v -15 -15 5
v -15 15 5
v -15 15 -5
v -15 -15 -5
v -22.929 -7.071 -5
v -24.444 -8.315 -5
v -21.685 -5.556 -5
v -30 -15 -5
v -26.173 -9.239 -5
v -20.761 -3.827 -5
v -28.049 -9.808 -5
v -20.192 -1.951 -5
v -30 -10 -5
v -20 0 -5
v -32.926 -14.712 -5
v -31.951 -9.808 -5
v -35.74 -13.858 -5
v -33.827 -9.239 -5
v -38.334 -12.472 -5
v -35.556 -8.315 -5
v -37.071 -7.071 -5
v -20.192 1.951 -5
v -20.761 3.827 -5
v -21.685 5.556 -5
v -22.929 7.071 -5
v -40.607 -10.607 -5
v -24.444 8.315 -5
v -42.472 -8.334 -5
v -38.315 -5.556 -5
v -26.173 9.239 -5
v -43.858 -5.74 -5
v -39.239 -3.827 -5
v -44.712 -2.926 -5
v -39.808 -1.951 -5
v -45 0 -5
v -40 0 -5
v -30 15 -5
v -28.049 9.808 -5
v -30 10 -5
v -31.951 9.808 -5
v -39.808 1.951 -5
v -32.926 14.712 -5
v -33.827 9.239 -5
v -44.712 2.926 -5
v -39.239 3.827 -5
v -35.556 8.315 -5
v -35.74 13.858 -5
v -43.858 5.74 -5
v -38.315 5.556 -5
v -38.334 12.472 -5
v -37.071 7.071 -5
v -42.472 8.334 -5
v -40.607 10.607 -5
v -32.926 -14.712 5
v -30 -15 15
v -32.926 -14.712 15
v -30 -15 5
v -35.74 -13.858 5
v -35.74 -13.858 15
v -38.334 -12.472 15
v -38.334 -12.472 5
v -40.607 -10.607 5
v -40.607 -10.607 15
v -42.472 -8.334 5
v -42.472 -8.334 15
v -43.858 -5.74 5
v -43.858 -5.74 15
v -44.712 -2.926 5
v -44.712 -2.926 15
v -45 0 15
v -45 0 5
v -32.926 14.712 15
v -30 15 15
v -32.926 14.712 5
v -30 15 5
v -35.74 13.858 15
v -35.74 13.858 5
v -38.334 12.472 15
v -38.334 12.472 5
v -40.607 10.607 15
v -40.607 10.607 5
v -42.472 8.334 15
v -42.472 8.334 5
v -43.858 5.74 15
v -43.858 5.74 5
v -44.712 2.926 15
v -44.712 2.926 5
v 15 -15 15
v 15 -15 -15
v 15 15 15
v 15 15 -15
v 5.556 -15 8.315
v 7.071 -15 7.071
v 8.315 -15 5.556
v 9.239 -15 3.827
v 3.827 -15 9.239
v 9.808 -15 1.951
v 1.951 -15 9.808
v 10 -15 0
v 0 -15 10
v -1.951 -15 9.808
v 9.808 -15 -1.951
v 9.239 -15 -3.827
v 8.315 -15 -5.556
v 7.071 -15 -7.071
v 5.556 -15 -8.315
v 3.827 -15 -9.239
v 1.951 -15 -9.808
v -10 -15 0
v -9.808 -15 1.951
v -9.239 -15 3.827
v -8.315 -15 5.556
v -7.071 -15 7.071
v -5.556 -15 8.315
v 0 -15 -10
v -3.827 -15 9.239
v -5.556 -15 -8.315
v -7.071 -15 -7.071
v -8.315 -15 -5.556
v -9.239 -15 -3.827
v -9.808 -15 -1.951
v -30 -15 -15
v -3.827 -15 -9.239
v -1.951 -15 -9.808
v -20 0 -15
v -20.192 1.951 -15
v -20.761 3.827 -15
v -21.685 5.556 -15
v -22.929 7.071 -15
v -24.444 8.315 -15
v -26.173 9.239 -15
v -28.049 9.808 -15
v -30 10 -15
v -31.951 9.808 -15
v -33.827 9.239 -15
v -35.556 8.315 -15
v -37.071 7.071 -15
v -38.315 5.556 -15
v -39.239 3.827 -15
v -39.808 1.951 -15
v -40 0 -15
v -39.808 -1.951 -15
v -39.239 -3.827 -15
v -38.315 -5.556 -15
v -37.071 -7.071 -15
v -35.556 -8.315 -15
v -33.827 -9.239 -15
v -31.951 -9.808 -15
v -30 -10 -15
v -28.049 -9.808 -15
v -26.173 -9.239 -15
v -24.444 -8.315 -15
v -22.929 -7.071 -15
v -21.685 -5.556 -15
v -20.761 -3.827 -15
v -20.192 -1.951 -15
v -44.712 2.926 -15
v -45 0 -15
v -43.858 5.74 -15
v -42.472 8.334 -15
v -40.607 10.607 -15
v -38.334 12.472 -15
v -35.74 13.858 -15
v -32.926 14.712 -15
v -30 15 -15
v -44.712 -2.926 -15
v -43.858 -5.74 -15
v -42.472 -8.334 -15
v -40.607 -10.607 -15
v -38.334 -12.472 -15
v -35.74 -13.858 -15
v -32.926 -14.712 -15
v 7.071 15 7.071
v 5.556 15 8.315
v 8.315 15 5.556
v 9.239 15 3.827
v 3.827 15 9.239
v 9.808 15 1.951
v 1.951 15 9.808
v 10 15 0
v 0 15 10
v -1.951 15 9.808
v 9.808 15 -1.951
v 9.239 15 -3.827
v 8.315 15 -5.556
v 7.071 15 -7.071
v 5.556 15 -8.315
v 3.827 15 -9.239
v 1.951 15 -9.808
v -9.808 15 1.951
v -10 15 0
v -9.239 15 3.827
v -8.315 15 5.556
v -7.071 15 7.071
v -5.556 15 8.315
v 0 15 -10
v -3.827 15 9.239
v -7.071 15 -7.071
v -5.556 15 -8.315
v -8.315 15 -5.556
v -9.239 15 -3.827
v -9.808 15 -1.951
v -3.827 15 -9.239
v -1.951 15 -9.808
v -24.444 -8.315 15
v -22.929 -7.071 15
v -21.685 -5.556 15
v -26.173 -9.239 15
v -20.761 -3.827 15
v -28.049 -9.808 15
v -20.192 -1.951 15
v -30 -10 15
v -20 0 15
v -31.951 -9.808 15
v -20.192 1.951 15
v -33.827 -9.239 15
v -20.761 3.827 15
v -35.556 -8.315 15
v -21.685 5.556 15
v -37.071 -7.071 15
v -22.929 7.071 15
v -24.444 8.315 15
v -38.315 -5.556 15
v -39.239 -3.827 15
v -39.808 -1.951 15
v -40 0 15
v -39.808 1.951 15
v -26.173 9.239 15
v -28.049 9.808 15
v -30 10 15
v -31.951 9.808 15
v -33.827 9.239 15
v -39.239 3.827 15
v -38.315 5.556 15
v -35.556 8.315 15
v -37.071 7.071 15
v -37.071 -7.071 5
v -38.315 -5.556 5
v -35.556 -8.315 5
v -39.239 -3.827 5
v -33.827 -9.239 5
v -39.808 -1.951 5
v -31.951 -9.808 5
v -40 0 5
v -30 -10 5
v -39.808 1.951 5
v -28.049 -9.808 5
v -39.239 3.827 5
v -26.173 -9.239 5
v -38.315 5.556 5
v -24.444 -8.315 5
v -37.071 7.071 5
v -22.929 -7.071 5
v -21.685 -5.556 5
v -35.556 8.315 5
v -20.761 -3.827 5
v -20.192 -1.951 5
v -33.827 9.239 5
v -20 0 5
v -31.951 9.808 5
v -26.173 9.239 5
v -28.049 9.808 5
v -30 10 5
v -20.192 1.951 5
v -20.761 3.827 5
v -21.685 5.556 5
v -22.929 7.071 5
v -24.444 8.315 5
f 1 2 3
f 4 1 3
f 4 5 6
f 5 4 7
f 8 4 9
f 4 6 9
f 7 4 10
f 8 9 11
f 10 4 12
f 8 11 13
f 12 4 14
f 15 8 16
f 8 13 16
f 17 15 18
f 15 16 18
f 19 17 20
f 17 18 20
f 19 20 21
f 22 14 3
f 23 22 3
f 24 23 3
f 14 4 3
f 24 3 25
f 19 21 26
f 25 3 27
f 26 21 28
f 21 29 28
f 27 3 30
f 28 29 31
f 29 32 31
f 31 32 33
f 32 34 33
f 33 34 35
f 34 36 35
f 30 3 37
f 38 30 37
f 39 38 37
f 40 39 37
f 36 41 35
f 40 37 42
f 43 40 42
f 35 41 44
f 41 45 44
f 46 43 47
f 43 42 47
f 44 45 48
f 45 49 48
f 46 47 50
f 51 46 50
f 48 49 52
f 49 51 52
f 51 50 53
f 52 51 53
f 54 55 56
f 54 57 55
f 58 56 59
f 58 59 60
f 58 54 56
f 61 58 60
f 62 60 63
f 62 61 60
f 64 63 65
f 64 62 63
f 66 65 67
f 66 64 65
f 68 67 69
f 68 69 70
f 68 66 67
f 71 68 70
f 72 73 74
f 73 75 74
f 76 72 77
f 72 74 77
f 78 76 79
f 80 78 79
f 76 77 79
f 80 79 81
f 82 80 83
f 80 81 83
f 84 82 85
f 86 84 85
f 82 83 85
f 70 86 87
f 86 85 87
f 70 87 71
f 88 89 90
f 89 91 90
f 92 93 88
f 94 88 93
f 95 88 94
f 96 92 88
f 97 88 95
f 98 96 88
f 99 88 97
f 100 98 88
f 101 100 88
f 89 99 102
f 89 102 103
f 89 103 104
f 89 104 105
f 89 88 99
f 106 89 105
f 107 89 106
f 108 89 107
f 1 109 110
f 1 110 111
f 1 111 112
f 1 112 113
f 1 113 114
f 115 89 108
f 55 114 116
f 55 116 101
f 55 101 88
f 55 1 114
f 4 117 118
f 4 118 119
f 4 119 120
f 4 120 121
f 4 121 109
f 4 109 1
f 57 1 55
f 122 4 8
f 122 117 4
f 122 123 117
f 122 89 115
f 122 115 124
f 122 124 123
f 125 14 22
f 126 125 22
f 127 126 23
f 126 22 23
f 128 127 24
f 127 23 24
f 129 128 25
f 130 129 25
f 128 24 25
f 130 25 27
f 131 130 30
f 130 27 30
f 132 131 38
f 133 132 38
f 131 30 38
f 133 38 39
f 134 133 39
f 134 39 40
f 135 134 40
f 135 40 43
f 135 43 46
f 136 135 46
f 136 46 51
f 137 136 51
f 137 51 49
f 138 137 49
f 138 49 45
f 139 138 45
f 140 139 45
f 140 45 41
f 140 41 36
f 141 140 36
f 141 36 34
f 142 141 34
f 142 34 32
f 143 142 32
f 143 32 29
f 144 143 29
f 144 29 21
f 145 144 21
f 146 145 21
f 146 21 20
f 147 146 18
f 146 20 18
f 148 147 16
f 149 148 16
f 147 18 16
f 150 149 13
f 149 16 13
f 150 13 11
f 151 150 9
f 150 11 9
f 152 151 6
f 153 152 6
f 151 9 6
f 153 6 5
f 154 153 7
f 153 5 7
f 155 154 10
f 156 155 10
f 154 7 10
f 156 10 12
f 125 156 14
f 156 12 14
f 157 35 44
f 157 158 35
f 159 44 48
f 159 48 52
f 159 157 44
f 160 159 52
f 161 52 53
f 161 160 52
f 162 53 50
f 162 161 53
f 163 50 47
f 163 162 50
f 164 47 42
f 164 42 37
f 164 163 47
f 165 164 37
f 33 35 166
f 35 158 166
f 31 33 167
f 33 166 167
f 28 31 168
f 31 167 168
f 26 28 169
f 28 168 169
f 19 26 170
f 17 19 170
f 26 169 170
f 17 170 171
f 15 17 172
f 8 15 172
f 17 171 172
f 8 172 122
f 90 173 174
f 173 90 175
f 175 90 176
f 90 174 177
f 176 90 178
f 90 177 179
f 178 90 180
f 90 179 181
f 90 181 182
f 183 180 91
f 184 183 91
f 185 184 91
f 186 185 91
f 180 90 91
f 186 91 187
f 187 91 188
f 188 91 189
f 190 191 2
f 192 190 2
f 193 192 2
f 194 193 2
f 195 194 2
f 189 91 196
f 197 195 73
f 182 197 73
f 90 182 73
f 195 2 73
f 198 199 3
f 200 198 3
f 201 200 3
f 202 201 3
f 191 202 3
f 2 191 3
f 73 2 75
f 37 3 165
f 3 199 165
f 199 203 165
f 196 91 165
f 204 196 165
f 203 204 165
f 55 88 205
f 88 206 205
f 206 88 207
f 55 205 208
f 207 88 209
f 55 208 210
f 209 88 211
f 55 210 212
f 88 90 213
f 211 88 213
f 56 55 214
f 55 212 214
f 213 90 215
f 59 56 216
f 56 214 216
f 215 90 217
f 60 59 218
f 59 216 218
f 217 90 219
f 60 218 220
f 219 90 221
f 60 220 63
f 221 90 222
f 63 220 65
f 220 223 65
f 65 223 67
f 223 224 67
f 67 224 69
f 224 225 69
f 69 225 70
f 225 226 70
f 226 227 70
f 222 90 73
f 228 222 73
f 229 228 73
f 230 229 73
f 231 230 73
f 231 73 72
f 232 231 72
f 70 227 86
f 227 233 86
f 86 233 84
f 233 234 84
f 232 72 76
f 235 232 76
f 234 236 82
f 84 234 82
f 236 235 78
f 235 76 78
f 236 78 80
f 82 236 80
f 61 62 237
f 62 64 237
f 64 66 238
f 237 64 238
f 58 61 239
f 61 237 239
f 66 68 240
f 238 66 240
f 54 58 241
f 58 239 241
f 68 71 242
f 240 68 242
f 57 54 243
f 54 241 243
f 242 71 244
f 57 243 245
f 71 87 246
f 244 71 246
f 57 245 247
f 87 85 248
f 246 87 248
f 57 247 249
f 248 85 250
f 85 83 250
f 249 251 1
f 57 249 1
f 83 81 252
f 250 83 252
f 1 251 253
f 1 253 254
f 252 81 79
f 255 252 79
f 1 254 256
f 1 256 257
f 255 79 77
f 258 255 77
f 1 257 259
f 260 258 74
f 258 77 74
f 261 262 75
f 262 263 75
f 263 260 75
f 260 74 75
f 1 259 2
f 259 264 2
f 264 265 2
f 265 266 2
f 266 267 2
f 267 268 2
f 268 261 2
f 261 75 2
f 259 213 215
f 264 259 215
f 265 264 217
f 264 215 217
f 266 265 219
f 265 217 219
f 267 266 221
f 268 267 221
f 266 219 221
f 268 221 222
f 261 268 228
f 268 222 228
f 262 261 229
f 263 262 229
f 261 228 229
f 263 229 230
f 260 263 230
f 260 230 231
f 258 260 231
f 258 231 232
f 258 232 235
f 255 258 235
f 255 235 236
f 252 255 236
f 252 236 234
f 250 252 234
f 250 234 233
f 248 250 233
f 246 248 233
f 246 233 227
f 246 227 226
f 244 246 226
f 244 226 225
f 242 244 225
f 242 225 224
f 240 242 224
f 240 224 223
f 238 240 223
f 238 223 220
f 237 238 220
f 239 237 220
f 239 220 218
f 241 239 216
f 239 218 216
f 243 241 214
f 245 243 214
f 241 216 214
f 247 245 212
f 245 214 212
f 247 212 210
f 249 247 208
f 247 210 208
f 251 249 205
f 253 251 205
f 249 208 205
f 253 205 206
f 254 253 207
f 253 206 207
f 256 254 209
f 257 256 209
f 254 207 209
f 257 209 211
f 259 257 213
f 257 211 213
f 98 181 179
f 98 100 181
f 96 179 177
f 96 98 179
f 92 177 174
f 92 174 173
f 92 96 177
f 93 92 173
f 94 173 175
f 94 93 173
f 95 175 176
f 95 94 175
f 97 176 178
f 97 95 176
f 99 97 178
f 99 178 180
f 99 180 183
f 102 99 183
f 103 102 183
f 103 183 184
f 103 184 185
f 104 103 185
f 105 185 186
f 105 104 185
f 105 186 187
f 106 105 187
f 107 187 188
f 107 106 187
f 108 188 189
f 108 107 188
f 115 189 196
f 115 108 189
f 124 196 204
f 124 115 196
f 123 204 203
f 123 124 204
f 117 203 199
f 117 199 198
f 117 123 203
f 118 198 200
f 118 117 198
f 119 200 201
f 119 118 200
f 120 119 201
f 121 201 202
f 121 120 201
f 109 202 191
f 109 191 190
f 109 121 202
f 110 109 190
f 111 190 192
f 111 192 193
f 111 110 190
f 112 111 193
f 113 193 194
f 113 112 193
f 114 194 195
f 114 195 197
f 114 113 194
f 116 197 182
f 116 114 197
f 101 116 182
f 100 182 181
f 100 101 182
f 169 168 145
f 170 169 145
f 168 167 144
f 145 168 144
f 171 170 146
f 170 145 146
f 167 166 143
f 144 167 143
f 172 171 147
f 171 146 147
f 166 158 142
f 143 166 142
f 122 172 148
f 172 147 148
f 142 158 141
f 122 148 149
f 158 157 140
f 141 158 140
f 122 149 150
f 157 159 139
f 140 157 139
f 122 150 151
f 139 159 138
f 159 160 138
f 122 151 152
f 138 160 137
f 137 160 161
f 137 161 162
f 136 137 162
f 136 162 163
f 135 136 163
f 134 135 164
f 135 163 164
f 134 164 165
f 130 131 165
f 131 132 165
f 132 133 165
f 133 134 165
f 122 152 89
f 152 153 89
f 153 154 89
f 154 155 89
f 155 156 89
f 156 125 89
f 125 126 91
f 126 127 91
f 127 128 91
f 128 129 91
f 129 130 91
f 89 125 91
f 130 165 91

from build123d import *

# Parameters (mm, degrees)
SKETCH1_R           = 10
BOSS_EXTRUDE1_DEPTH = 15
SKETCH2_R           = 10
CUT_EXTRUDE1_DEPTH  = 57.124860802
FILLET1_R           = 15


with BuildPart() as part:
    # Sketch1 → Boss-Extrude1 (new, symmetric)
    with BuildSketch(Plane(origin=(0, 0, 0), x_dir=(1, 0, 0), z_dir=(0, 1, 0))):
        Polygon((-45, 15), (15, 15), (15, -15), (-45, -15), (-45, -5), (-15, -5), (-15, 5), (-45, 5), align=None)
        with Locations(Location((0, 0, 0), (0, 0, 270))):
            Circle(SKETCH1_R, mode=Mode.SUBTRACT)
    extrude(amount=BOSS_EXTRUDE1_DEPTH, both=True)

    # Sketch2 → Cut-Extrude1 (cut, through all)
    with BuildSketch(Plane.XY.offset(15)):
        with Locations((-30, 0)):
            Circle(SKETCH2_R)
    extrude(amount=-CUT_EXTRUDE1_DEPTH, mode=Mode.SUBTRACT)

    # Fillet1
    fillet1_edges = [part.edges().sort_by_distance(p)[0] for p in [
        (-45, -15, -10),
        (-45, 15, -10),
        (-45, -15, 10),
        (-45, 15, 10),
    ]]
    fillet(fillet1_edges, radius=FILLET1_R - 0.0001)  # a hair under: the kernel refuses the full size


solid = part.part
